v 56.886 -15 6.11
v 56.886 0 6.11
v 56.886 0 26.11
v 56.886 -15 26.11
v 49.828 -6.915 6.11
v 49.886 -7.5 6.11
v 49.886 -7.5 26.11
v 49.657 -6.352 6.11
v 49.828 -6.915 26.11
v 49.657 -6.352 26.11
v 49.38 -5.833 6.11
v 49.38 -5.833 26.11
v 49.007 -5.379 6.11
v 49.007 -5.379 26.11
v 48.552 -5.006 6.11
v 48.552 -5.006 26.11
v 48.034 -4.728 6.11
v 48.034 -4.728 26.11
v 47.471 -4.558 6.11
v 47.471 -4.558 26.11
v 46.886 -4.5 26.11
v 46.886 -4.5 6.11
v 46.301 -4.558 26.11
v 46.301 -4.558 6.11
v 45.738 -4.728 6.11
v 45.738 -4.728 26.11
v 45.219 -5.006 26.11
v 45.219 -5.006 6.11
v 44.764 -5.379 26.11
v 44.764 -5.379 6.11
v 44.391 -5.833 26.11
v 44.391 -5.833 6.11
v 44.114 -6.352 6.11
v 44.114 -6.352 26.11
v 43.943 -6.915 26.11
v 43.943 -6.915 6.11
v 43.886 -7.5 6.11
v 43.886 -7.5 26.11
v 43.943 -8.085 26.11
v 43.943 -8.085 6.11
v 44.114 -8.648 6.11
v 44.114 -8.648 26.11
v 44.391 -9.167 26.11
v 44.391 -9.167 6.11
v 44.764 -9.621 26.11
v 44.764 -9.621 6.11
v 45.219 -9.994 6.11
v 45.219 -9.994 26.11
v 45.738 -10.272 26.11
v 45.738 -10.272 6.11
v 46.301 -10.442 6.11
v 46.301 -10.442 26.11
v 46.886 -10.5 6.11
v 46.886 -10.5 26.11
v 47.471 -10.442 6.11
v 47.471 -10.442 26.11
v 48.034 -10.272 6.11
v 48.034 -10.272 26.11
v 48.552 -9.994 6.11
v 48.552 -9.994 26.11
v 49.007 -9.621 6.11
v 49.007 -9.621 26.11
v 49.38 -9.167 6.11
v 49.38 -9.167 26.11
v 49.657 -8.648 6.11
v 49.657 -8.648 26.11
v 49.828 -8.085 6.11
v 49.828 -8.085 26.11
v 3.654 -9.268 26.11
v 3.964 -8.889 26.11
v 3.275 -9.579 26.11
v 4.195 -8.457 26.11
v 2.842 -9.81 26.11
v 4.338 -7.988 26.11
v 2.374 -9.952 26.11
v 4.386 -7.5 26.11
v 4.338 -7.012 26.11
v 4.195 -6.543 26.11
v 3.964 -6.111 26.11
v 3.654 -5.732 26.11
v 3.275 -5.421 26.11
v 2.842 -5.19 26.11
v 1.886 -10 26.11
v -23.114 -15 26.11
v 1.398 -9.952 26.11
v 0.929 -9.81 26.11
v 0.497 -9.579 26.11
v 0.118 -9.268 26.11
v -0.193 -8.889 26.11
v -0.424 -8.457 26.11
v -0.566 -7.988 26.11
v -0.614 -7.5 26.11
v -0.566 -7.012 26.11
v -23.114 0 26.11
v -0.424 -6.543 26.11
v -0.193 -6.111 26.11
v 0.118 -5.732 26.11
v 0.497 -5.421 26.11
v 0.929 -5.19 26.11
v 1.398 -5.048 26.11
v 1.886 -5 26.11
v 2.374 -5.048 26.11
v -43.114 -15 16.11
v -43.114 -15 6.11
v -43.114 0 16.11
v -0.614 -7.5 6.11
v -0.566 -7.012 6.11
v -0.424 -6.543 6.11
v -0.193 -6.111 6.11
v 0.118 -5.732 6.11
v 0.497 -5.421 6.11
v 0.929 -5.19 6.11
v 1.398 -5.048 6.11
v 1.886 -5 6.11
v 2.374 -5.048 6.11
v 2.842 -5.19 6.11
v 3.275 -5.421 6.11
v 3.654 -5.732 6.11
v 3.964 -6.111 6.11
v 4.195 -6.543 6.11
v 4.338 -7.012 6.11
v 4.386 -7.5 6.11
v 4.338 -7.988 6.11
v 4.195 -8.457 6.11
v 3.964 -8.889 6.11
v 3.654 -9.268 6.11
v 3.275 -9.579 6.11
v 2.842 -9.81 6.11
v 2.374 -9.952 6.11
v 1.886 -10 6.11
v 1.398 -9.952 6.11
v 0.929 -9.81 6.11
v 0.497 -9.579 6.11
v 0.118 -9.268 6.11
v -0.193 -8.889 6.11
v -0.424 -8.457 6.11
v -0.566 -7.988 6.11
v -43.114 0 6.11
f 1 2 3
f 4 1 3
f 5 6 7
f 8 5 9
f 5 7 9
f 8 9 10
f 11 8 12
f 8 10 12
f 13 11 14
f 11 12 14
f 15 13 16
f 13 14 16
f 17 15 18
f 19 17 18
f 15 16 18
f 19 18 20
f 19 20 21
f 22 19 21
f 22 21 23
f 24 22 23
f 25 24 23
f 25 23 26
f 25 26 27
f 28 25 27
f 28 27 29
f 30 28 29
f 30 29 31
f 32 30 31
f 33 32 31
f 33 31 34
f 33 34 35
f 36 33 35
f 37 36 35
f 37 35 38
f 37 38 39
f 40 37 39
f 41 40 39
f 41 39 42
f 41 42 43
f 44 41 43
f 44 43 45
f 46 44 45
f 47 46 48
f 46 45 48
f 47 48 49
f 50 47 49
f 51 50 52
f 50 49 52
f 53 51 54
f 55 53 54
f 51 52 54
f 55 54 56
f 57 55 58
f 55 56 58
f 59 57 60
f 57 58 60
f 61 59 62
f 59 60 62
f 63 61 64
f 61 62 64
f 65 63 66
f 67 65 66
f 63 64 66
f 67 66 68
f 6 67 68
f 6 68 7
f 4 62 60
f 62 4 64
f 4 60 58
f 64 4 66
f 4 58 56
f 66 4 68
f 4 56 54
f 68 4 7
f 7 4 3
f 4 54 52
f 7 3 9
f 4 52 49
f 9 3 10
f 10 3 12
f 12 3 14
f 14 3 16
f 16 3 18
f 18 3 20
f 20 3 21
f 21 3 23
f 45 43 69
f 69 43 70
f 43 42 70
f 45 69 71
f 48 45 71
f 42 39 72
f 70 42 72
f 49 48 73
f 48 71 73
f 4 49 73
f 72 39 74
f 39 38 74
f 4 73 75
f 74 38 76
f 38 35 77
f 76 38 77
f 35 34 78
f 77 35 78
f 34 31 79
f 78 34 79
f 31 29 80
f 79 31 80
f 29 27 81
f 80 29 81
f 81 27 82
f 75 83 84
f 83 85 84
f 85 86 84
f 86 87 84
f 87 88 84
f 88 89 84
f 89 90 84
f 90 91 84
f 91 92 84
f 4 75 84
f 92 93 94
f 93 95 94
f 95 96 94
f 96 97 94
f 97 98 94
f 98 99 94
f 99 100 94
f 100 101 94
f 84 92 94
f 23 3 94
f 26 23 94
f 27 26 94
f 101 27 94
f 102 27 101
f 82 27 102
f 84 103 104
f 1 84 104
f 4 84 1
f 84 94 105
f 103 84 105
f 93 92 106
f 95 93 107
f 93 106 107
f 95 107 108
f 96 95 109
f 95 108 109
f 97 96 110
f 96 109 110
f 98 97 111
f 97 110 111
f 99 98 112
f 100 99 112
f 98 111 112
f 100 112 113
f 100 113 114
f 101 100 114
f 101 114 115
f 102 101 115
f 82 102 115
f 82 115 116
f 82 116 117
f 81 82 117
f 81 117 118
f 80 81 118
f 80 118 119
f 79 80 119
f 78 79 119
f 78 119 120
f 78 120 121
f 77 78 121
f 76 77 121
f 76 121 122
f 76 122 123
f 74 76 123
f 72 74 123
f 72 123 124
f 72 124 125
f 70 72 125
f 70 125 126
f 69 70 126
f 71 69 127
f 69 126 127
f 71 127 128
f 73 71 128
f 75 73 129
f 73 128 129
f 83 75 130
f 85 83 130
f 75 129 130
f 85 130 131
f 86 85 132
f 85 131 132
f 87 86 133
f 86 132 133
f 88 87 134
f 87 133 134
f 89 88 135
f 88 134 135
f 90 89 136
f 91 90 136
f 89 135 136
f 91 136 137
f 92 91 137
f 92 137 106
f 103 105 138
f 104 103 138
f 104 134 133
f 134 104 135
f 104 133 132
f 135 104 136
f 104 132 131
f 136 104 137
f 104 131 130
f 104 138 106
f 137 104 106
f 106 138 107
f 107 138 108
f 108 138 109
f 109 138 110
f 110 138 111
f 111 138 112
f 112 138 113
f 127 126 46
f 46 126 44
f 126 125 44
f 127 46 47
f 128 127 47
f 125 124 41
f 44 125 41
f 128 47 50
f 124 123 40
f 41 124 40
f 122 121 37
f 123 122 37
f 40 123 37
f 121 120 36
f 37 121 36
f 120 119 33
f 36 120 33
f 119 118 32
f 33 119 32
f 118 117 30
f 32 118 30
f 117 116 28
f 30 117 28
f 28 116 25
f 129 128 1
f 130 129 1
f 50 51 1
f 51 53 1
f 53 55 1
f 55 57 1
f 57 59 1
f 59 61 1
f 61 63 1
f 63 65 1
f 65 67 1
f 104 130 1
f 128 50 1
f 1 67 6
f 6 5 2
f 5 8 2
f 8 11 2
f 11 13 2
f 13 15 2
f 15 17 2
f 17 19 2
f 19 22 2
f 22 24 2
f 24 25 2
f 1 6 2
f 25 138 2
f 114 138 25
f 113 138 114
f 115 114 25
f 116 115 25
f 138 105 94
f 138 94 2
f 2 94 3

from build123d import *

# Parameters (mm, degrees)
F1_DEPTH = 15
F3_D     = 5
F2_R     = 3
F4_DEPTH = 25


with BuildPart() as f1:
    # F0 (on Front) → F1 (new body)
    with BuildSketch(Plane.XZ):
        Polygon((-43.1142237037, 16.1099138111), (-43.1142237037, 6.1099138111), (56.8857762963, 6.1099138111), (56.8857762963, 26.1099138111), (-23.1142237037, 26.1099138111), align=None)
    extrude(amount=F1_DEPTH)

    # F3 (through all)
    with Locations(Plane.XY.offset(26.1099138111)):
        with Locations((1.8857762963, -7.5)):
            Hole(F3_D / 2)

    # F2 (on face) → F4 (cut)
    with BuildSketch(Plane.XY.offset(26.1099138111)):
        with Locations((46.8857762963, -7.5)):
            Circle(F2_R)
    extrude(amount=-F4_DEPTH, mode=Mode.SUBTRACT)


solid = f1.part
